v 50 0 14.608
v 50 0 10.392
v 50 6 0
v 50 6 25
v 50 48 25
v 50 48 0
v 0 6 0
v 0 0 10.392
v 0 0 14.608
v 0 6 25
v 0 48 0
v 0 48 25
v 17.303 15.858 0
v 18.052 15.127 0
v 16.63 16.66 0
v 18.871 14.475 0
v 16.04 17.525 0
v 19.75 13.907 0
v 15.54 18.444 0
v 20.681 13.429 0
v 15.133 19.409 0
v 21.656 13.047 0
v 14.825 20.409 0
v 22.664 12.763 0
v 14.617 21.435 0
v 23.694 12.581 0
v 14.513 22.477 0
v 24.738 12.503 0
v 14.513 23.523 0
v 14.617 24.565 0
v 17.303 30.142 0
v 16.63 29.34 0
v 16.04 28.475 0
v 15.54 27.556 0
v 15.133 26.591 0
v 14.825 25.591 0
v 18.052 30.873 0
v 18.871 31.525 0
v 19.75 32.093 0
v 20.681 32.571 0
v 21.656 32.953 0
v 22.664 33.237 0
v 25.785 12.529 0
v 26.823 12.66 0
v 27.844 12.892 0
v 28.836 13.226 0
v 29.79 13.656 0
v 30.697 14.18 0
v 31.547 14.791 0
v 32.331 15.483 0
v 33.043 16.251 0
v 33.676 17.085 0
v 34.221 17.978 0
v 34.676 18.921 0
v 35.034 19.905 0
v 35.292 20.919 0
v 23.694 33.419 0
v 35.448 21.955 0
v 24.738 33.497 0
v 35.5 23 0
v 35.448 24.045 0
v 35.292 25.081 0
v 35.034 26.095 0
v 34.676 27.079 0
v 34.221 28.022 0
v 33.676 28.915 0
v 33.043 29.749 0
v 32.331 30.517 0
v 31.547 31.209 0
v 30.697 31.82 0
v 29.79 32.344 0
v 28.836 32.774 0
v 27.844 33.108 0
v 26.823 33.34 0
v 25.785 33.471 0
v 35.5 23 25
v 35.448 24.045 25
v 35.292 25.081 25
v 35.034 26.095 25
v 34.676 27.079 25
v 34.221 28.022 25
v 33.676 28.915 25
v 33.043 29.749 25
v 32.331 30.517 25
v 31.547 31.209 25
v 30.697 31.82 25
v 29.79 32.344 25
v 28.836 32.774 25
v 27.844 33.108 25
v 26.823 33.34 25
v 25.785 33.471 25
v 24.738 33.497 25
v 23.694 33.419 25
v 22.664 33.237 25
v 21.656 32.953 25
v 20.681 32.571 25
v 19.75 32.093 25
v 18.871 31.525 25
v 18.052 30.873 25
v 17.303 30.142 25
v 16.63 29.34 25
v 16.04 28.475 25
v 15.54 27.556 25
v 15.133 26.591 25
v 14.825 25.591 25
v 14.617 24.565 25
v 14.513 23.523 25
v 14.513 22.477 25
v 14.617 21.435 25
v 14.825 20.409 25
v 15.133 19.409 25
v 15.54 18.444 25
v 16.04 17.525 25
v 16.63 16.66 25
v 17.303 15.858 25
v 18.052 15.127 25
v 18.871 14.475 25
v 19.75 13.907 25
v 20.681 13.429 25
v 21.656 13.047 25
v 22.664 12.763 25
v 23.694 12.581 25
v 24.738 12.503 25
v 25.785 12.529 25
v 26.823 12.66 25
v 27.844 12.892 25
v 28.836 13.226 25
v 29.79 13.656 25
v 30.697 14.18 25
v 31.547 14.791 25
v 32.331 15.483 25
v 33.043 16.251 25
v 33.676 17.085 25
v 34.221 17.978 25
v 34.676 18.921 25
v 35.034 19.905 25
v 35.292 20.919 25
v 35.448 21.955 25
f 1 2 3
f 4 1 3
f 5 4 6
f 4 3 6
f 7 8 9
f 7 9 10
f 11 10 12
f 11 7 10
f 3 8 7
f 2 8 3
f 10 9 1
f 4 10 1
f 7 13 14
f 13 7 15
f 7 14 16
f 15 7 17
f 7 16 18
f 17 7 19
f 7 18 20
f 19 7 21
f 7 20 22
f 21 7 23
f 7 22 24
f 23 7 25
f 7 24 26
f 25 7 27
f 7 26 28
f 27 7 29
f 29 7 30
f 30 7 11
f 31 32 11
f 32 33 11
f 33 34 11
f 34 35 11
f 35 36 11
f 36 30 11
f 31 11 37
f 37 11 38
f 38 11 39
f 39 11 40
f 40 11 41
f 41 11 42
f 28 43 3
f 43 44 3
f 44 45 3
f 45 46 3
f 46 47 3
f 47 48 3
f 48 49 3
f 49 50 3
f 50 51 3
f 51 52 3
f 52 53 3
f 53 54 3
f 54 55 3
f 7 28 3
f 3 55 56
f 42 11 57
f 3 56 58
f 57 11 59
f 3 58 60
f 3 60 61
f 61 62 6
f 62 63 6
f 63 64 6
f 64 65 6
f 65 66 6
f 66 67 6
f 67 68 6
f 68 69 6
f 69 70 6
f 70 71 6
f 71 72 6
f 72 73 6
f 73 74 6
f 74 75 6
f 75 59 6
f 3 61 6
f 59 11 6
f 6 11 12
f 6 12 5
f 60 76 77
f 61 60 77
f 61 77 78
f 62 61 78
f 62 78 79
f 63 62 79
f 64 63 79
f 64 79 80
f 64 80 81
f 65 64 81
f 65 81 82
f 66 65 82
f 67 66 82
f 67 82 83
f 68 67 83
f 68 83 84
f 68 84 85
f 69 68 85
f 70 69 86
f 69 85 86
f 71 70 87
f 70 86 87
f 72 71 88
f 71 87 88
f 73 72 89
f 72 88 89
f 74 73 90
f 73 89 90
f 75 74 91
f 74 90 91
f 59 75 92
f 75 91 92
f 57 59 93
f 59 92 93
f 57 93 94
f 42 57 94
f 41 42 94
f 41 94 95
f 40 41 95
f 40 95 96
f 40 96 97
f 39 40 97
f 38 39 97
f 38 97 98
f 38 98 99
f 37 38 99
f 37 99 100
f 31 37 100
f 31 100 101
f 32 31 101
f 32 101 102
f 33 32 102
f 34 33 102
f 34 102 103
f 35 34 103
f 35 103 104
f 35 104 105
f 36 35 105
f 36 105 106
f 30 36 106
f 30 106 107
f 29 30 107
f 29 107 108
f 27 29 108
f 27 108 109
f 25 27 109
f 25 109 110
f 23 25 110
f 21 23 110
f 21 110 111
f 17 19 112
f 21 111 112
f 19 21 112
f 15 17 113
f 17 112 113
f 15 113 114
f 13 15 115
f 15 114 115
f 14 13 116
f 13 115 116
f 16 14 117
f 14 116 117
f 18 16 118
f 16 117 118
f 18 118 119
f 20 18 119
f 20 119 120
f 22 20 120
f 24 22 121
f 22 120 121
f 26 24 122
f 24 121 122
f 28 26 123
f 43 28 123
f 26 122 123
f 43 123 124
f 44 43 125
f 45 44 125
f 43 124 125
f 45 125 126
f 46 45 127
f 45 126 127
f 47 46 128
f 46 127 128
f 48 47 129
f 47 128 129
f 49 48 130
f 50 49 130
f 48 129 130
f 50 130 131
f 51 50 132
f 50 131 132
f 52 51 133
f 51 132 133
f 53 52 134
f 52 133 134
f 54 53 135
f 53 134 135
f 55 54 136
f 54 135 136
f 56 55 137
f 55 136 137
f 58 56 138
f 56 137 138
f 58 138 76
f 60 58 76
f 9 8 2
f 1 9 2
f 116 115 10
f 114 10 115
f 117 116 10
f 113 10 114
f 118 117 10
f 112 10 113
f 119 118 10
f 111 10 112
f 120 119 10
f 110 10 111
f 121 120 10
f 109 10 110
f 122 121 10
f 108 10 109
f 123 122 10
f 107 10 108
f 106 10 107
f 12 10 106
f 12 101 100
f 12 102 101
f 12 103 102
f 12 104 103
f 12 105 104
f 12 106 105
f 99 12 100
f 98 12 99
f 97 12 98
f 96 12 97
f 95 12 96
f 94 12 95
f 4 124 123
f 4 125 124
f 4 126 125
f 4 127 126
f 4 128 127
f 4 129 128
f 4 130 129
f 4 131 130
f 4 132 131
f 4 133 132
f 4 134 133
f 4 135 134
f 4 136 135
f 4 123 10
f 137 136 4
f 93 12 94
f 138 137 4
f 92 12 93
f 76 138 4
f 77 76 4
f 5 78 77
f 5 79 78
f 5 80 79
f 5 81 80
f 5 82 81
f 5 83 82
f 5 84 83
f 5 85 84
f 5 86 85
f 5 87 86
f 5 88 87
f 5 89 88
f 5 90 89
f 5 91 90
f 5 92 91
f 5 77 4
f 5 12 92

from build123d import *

# Parameters (mm, degrees)
SKETCH_1_W          = 50
SKETCH_1_H          = 48
EXTRUDE_1_DEPTH     = 25
SKETCH_2_R          = 10.5
CUT_EXTRUDE_1_DEPTH = 26
CHAMFER_1_SIZE      = 6
CHAMFER_1_SIZE2     = 10.392304845
CHAMFER_2_SIZE      = 6
CHAMFER_2_SIZE2     = 10.392304845


with BuildPart() as part:
    # Эскиз1 → Бобышка-Вытянуть1 (new body)
    with BuildSketch(Plane.XY):
        with Locations((25, 24)):
            Rectangle(SKETCH_1_W, SKETCH_1_H)
    extrude(amount=EXTRUDE_1_DEPTH)

    # Эскиз2 → Вырез-Вытянуть1 (cut, through all)
    with BuildSketch(Plane.XY.offset(25)):
        with Locations((25, 23)):
            Circle(SKETCH_2_R)
    extrude(amount=-CUT_EXTRUDE_1_DEPTH, mode=Mode.SUBTRACT)

    # Фаска1
    chamfer_1_edges = [part.edges().sort_by_distance(p)[0] for p in [
        (25, 0, 0),
    ]]
    chamfer_1_side = [part.faces().sort_by_distance(p)[0] for p in [
        (25, 0.693108938, 0),
    ]]
    chamfer(chamfer_1_edges, length=CHAMFER_1_SIZE, length2=CHAMFER_1_SIZE2, reference=chamfer_1_side[0])

    # Фаска2
    chamfer_2_edges = [part.edges().sort_by_distance(p)[0] for p in [
        (25, 0, 25),
    ]]
    chamfer_2_side = [part.faces().sort_by_distance(p)[0] for p in [
        (25, 0.693108938, 25),
    ]]
    chamfer(chamfer_2_edges, length=CHAMFER_2_SIZE, length2=CHAMFER_2_SIZE2, reference=chamfer_2_side[0])


solid = part.part
